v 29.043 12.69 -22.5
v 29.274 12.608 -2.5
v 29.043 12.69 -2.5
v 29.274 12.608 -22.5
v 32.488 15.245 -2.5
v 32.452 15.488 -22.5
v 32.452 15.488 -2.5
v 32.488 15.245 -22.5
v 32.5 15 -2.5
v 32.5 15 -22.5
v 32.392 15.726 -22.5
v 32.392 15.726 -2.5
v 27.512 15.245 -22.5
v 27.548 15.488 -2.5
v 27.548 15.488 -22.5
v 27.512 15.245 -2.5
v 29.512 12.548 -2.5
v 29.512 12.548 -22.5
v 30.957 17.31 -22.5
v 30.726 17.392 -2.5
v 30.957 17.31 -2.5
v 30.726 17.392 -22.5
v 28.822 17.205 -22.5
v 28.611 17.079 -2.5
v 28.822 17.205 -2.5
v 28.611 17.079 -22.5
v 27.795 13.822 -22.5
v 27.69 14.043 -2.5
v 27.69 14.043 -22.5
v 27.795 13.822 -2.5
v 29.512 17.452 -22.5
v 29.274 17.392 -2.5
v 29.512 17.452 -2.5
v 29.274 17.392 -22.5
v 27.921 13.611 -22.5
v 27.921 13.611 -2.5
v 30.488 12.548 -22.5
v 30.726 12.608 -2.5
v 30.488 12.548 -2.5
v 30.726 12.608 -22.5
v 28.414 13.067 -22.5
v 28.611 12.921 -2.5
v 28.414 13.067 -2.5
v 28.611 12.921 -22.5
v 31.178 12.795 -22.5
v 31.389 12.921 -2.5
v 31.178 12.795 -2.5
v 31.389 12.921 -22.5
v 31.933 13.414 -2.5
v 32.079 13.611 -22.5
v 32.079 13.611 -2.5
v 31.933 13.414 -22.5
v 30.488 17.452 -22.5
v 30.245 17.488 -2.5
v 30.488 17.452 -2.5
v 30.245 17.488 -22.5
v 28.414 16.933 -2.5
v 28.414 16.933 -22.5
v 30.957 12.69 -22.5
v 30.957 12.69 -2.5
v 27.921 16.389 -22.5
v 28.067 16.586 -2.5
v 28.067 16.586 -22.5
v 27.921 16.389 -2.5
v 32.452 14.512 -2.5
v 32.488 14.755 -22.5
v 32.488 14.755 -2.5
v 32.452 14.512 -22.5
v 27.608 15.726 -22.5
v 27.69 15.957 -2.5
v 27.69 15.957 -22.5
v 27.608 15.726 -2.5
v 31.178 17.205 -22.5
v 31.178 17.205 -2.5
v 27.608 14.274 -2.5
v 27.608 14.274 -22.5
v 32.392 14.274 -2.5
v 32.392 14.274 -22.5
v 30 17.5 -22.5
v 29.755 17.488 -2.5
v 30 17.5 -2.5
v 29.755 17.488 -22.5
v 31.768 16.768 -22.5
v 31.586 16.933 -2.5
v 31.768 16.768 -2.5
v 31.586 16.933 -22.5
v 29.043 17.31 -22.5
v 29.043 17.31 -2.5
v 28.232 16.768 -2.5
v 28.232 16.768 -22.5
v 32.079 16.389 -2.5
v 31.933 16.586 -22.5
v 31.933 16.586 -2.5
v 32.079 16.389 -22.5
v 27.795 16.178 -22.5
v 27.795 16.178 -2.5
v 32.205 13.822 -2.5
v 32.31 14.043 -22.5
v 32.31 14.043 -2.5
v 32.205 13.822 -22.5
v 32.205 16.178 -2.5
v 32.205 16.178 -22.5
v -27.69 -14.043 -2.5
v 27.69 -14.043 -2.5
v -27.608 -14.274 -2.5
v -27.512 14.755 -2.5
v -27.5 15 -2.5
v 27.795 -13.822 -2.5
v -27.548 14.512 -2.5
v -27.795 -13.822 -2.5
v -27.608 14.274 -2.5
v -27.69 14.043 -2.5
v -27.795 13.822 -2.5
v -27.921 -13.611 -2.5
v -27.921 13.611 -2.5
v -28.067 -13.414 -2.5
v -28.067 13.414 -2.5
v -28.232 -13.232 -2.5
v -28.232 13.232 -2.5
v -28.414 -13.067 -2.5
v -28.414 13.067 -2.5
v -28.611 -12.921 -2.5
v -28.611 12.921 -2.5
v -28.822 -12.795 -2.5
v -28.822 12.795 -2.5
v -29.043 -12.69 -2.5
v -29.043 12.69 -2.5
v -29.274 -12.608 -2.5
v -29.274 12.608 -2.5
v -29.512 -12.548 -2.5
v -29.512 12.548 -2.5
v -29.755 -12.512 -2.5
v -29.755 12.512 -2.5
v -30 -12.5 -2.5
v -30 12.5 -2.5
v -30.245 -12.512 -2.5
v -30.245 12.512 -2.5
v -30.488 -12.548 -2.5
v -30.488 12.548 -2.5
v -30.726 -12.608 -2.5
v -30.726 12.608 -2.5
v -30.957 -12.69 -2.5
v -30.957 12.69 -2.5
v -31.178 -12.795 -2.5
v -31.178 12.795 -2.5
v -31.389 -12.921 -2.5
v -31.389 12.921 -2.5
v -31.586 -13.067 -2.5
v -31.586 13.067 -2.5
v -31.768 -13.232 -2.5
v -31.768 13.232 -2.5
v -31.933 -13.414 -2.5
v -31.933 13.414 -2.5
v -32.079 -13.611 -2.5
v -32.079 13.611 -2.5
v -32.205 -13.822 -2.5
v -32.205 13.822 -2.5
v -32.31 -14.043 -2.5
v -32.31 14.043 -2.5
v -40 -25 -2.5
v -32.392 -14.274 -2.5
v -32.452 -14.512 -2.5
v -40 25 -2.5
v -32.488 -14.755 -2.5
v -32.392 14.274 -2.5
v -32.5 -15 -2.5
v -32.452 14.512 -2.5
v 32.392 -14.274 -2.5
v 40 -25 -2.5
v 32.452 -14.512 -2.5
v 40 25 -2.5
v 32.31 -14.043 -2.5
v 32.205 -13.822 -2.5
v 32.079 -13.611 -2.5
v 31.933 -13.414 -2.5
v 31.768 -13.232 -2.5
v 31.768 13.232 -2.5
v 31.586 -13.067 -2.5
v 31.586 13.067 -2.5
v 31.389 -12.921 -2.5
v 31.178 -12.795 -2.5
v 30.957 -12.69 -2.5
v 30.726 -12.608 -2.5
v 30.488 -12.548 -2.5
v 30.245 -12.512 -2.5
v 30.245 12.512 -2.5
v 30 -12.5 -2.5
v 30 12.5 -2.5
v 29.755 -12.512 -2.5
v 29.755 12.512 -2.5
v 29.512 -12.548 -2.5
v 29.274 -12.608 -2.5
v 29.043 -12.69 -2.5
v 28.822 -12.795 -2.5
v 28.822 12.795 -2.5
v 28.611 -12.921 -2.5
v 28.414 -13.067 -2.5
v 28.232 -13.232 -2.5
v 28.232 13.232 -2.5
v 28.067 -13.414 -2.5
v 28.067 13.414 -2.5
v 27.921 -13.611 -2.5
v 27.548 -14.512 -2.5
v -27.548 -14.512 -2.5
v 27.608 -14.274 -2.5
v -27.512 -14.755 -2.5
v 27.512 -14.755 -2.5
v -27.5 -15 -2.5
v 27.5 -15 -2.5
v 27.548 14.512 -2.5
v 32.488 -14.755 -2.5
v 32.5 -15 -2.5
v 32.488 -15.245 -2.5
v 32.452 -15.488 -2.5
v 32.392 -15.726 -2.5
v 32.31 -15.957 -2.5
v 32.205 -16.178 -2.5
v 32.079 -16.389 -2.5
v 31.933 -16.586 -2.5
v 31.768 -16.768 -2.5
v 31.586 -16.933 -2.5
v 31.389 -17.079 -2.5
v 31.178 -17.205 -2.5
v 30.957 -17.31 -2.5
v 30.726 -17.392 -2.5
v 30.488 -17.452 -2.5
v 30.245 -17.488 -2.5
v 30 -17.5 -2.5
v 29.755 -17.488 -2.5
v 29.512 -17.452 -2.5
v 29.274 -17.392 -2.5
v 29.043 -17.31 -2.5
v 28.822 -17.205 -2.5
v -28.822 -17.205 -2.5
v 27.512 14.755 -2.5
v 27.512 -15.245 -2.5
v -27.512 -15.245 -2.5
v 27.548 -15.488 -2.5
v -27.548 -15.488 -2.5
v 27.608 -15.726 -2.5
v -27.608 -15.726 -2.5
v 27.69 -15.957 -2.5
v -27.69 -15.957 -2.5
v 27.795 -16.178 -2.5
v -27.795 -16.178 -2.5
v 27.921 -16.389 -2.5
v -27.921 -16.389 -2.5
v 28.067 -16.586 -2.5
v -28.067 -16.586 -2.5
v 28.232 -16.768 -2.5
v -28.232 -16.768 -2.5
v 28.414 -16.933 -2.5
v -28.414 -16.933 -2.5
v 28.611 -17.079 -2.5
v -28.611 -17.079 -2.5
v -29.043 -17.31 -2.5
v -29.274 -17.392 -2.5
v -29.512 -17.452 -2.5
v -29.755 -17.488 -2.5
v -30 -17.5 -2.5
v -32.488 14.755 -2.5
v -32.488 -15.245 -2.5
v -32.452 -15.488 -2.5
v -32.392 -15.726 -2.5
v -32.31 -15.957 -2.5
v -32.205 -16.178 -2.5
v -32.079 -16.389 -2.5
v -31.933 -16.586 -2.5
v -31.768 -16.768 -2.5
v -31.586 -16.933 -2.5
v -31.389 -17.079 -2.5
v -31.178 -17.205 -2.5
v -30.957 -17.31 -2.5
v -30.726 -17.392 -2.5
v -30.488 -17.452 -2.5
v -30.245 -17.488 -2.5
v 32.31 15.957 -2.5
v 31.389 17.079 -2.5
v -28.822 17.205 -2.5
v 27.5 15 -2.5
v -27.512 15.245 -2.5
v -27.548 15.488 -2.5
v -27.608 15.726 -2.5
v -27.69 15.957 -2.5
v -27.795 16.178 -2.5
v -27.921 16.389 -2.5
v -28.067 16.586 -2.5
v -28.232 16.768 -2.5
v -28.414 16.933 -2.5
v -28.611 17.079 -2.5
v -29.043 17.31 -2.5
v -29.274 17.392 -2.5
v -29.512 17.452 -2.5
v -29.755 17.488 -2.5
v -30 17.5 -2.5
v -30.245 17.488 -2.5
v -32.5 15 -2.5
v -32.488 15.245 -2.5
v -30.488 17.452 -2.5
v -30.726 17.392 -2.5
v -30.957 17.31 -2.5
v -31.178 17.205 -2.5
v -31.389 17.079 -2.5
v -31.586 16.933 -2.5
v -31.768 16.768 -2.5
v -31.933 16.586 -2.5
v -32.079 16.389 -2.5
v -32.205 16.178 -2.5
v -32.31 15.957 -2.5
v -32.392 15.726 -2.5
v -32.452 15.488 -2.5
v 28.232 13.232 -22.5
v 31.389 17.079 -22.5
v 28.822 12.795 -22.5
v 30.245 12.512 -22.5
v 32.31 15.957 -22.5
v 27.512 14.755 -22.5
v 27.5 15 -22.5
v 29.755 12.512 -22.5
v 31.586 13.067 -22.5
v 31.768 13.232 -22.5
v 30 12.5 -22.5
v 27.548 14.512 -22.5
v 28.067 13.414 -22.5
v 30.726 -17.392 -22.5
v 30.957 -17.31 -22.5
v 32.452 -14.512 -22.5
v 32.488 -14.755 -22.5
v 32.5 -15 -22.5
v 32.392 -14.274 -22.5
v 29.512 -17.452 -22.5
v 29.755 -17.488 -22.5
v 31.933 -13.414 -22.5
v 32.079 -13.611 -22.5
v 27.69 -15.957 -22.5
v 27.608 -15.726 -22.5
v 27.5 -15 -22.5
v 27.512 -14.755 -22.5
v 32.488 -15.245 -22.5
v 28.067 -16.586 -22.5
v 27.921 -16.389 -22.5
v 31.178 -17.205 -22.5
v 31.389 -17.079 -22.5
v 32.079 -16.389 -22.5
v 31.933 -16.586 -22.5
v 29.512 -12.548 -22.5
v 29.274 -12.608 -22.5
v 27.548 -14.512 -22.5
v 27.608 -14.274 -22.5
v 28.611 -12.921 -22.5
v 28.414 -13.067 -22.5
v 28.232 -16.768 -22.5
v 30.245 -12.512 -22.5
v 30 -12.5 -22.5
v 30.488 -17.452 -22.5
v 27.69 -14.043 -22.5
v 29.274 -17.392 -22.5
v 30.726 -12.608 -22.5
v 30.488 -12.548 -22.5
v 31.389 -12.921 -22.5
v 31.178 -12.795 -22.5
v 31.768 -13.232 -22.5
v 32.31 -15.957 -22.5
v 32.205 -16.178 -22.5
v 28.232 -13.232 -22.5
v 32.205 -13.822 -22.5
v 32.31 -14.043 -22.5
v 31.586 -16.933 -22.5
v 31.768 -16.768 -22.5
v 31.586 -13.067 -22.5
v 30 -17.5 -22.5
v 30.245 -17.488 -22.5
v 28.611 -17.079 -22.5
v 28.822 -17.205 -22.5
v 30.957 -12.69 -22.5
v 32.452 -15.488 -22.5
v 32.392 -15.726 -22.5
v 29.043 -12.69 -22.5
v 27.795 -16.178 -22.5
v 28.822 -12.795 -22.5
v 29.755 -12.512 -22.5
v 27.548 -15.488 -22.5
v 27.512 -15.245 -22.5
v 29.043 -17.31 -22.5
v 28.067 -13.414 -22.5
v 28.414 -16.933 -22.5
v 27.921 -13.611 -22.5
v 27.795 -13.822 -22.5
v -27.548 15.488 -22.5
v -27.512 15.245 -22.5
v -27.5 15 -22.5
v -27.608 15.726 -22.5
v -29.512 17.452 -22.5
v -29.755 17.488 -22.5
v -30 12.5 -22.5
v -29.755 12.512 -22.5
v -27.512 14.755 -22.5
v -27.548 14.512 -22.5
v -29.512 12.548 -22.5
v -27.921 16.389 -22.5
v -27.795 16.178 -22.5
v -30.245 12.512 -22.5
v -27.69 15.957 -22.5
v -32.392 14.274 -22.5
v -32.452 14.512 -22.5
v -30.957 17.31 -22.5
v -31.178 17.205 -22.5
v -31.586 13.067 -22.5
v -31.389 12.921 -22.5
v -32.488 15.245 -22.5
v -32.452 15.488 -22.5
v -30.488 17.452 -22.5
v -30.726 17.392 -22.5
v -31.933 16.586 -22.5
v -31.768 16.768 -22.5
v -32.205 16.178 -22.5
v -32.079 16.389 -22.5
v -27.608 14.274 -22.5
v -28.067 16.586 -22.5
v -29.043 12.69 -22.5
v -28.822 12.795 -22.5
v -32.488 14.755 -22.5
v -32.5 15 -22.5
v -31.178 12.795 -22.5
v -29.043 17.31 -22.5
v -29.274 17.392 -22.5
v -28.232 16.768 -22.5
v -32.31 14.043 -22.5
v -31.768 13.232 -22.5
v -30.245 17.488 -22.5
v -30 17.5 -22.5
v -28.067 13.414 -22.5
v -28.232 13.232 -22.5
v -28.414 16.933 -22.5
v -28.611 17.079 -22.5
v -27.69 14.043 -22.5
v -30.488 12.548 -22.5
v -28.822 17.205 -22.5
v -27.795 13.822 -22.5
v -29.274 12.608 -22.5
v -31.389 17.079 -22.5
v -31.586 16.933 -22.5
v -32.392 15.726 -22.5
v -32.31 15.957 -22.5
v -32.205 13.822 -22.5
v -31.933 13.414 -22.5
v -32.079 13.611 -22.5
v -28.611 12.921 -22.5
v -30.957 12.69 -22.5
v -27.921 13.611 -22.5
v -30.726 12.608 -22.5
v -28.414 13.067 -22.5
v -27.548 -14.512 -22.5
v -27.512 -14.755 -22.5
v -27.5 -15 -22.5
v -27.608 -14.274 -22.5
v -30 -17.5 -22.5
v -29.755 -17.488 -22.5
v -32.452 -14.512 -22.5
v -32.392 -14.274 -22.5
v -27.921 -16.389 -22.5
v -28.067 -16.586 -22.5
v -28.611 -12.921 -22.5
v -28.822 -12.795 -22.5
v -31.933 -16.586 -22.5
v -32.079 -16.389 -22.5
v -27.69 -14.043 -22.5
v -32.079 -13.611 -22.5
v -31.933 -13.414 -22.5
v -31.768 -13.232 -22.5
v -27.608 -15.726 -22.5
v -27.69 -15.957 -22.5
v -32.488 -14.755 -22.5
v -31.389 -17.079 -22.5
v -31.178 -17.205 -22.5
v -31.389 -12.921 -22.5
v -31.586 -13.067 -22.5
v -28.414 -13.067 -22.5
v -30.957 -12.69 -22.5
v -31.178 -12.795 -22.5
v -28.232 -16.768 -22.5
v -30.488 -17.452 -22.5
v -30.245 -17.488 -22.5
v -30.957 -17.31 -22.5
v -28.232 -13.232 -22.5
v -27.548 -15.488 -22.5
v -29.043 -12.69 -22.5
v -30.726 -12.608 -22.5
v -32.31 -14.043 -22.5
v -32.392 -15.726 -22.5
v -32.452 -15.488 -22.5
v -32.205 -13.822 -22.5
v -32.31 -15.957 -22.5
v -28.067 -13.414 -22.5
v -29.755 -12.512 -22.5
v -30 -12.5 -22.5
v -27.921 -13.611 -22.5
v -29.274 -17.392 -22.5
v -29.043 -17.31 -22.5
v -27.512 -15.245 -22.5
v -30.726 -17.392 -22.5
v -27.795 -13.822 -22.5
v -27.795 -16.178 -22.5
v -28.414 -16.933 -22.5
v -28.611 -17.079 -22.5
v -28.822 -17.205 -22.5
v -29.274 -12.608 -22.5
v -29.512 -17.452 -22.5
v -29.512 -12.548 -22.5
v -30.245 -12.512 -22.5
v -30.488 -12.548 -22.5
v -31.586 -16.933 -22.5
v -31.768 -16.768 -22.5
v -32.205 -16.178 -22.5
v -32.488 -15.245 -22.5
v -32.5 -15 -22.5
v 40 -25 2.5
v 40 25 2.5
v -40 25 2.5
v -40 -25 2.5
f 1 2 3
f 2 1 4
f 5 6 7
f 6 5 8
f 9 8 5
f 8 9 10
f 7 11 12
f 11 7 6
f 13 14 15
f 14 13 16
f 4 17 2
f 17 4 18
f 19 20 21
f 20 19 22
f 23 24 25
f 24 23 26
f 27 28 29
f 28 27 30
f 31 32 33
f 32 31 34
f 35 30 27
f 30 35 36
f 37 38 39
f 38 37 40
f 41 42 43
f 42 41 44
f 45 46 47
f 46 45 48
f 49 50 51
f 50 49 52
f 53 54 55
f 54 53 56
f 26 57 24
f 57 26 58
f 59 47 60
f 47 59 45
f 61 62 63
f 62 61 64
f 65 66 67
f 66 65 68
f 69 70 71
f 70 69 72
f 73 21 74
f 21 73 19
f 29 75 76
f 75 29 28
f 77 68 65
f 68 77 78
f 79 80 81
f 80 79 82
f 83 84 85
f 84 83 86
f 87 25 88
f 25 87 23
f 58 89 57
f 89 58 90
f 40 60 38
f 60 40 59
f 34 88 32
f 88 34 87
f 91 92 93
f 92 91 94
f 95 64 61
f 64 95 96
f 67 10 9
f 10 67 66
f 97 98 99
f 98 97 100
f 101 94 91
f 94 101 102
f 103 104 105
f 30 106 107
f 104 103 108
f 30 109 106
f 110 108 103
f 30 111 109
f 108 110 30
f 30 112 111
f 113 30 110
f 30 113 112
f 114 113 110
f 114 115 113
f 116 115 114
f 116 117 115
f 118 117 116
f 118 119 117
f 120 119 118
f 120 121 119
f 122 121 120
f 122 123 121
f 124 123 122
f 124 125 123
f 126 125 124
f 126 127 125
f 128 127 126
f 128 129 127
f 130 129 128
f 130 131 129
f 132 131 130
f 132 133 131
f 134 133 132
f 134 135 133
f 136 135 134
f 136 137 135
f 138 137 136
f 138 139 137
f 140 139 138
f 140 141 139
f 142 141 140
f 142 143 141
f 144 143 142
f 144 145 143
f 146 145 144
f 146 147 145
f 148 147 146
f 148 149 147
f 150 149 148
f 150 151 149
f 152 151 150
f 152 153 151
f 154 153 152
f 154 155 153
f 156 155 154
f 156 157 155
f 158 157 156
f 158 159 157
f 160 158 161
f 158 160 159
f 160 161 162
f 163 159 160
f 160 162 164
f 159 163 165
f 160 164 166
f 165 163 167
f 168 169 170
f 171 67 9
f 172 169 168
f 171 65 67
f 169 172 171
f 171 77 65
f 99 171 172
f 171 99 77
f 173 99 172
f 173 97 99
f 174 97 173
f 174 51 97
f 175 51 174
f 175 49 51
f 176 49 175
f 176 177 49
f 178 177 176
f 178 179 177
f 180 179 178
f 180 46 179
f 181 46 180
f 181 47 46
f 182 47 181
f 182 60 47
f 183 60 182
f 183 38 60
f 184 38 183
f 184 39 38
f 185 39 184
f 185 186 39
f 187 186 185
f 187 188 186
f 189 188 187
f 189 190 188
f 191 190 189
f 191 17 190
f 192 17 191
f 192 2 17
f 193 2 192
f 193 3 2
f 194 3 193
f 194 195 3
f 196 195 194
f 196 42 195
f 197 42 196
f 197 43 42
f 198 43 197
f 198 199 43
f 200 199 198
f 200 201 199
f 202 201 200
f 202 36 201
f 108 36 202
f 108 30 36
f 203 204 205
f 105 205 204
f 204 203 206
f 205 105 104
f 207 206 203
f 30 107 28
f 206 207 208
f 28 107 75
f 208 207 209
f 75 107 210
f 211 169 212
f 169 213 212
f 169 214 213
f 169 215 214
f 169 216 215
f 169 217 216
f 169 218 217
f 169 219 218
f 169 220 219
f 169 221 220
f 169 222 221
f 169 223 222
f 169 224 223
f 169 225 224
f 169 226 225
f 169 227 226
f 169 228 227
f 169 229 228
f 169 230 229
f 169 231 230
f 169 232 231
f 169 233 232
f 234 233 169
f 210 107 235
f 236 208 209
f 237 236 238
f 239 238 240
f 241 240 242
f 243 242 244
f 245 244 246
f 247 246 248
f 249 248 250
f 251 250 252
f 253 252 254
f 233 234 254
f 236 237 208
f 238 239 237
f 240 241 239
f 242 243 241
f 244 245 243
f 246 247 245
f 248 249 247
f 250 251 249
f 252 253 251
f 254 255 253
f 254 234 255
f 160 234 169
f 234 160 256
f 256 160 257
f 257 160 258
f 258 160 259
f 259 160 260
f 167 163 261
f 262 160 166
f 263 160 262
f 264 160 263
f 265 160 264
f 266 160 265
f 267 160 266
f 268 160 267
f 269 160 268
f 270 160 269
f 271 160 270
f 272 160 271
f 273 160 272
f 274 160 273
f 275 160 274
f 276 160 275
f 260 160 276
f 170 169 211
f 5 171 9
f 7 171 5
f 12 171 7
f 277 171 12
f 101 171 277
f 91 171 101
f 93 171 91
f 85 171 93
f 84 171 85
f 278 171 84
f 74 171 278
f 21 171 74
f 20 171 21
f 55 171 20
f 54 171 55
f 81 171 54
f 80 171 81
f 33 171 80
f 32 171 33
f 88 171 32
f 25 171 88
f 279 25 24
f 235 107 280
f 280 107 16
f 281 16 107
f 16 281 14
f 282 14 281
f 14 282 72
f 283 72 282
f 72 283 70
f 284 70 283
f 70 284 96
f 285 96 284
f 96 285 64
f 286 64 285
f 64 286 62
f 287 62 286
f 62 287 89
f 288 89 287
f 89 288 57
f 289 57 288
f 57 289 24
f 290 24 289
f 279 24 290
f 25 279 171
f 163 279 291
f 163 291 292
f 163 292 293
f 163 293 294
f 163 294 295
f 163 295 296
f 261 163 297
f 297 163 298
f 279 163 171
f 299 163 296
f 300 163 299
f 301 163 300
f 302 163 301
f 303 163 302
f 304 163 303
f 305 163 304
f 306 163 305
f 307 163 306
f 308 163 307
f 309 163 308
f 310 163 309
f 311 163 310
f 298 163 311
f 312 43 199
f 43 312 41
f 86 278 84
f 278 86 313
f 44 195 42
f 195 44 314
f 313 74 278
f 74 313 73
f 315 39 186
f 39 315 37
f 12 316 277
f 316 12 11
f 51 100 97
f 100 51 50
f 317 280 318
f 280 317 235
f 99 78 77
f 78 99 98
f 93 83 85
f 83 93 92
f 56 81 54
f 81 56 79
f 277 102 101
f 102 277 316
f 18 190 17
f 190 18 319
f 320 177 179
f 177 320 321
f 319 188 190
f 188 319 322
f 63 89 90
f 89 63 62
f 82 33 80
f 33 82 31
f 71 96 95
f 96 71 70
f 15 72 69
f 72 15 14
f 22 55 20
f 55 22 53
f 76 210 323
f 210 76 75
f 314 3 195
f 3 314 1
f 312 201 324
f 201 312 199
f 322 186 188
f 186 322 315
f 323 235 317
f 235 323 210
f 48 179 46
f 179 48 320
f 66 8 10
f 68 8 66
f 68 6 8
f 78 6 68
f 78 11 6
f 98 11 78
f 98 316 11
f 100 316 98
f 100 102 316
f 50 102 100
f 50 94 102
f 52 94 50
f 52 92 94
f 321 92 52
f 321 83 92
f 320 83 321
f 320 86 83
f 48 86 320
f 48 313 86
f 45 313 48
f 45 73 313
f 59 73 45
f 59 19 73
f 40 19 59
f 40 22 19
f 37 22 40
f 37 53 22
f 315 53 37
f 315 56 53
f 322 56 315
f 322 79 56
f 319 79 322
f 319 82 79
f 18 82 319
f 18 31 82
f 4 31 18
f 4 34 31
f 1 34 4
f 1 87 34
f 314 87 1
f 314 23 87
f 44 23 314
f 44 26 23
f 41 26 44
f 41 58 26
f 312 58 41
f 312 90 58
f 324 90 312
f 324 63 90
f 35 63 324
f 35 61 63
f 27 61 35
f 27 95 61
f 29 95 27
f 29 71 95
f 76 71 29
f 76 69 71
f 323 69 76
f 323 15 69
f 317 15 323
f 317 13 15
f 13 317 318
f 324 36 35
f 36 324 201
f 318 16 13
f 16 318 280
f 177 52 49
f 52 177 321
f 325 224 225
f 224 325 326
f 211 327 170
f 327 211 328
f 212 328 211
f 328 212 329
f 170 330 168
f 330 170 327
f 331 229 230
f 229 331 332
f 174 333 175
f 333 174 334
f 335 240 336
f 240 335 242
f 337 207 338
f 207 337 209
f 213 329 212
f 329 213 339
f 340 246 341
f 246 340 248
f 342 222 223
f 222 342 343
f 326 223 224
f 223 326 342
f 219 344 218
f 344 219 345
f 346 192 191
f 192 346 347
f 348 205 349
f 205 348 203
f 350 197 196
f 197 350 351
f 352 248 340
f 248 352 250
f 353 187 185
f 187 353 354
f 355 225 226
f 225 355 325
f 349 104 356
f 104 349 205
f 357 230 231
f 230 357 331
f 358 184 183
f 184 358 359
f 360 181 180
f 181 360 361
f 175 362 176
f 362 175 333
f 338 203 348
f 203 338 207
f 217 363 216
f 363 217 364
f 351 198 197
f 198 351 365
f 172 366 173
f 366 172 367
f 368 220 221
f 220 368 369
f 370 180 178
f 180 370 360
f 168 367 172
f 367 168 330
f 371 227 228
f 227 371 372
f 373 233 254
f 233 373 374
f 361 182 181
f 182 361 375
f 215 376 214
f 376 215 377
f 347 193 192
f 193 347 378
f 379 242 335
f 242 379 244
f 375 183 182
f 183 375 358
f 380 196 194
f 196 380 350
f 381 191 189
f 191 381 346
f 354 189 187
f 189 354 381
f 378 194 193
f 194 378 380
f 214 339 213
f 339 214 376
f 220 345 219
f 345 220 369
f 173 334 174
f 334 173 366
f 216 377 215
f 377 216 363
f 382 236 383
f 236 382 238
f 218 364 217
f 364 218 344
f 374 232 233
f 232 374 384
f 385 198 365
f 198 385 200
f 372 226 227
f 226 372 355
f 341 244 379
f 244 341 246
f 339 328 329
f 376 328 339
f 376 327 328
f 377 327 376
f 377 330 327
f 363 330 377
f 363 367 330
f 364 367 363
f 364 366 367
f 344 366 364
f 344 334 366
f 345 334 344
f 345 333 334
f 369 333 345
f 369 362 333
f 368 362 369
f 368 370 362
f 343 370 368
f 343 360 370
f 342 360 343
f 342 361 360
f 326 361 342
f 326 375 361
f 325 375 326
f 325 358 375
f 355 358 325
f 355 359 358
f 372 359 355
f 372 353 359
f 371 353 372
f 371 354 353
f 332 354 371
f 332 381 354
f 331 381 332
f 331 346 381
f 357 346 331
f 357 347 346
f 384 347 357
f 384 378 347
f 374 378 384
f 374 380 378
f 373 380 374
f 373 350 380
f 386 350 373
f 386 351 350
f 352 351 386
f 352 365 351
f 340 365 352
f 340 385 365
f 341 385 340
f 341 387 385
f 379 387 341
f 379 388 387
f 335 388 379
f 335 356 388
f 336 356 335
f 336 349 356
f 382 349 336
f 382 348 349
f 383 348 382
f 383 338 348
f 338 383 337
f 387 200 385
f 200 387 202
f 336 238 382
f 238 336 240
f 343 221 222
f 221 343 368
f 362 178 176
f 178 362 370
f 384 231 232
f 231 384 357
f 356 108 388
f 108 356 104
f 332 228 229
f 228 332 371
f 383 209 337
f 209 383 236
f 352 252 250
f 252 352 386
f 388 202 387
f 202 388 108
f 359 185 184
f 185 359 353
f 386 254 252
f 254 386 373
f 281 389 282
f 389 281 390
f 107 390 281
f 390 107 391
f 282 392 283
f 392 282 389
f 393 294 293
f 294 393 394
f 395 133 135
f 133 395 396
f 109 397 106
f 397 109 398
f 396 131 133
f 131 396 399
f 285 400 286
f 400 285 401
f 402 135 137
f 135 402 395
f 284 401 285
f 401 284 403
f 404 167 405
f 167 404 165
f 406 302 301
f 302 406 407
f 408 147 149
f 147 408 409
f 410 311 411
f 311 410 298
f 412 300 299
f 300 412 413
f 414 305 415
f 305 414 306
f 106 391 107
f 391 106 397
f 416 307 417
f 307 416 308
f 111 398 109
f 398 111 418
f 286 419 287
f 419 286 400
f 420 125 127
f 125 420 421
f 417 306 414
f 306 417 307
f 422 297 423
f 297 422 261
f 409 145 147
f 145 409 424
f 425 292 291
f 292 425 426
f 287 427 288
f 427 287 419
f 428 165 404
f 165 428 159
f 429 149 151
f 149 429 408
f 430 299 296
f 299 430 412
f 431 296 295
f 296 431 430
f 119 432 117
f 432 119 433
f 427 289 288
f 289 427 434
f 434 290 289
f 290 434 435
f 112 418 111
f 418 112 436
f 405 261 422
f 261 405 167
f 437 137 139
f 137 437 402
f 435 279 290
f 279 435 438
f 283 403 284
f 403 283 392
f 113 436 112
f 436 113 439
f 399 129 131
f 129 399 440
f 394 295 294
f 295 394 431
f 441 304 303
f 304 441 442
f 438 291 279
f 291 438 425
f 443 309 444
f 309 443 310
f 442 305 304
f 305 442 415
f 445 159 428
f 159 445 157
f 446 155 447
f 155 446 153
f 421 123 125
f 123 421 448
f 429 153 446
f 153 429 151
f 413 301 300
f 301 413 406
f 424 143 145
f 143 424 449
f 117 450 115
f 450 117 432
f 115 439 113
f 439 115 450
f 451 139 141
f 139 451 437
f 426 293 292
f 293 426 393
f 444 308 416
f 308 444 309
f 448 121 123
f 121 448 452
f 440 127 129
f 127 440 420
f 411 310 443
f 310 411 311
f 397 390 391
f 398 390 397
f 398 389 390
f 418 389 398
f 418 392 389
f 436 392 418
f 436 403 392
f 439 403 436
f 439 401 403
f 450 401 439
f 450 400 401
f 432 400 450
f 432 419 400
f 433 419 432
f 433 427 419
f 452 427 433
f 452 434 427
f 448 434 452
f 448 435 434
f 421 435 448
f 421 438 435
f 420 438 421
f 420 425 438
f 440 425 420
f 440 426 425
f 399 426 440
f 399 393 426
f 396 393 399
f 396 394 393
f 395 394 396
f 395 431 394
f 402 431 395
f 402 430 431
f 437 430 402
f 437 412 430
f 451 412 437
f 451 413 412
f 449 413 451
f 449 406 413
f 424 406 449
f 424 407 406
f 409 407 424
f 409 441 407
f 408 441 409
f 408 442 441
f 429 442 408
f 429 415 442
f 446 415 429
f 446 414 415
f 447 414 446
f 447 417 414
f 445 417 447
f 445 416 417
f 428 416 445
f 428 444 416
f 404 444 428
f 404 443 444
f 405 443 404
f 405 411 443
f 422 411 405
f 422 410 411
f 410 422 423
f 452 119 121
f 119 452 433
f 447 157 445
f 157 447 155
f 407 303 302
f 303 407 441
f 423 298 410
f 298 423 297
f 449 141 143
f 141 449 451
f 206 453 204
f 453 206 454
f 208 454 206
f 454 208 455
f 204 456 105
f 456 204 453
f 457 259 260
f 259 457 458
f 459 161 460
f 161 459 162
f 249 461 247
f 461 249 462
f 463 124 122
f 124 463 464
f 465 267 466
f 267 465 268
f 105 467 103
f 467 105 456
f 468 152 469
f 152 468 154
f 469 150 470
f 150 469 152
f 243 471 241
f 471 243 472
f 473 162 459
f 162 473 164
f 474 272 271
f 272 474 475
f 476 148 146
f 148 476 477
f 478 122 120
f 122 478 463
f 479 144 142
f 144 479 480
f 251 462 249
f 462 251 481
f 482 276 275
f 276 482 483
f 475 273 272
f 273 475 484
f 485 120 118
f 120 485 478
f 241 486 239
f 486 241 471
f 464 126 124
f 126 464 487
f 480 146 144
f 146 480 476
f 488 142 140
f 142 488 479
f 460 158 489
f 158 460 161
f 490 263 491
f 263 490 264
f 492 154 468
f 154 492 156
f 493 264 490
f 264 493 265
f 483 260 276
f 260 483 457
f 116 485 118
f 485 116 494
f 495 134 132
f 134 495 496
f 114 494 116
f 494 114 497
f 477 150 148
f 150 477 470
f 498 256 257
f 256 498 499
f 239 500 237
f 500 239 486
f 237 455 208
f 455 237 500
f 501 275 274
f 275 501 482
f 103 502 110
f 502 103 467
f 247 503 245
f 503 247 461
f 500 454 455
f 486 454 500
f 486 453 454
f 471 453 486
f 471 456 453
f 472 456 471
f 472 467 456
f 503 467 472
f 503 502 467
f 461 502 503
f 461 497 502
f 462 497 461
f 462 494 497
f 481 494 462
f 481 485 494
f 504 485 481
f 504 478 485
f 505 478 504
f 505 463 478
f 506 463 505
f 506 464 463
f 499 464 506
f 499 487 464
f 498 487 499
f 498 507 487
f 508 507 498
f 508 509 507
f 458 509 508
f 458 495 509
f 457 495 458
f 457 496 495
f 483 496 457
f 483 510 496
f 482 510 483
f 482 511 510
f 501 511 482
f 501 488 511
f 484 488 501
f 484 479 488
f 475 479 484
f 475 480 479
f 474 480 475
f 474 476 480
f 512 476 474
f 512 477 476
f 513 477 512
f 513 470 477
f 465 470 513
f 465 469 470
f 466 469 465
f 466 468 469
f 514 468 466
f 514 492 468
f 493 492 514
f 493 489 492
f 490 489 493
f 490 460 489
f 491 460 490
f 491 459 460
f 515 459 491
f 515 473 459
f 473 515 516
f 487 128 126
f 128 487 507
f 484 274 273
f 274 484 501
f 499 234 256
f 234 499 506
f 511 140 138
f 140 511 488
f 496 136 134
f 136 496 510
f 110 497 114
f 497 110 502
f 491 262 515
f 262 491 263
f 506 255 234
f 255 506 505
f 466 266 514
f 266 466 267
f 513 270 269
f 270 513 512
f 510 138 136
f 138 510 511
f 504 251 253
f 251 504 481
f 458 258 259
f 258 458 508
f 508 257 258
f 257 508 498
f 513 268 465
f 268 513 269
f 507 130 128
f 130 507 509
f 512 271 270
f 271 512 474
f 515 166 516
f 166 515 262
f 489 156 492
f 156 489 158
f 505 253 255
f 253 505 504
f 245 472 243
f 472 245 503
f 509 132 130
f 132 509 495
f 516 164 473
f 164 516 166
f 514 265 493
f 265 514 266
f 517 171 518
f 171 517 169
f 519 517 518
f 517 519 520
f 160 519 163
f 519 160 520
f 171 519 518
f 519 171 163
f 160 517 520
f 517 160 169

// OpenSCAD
$fn = 64;

module base(x = 80,y = 50,z = 5){
    
    cube([x,y,z], center = true);
    
    }
    
//base(z = 10);    
    
module legs(d = 5, h = 20){
    
    cylinder(h = h,  d = d, center = true);
    
    }
    
//legs();
    
    
module assembly(x = 80,y = 50,z = 5, d = 5, h = 20){
    
    base(x,y,z);
    
    for(i = [x/2 -10,-x/2 + 10]){
        for(j = [y/2 -10,-y/2+10]){
            
            translate([i,j,-z/2 - h/2])
                legs(d,h);
            
            }
        
        }
    
    }
    
 assembly();
